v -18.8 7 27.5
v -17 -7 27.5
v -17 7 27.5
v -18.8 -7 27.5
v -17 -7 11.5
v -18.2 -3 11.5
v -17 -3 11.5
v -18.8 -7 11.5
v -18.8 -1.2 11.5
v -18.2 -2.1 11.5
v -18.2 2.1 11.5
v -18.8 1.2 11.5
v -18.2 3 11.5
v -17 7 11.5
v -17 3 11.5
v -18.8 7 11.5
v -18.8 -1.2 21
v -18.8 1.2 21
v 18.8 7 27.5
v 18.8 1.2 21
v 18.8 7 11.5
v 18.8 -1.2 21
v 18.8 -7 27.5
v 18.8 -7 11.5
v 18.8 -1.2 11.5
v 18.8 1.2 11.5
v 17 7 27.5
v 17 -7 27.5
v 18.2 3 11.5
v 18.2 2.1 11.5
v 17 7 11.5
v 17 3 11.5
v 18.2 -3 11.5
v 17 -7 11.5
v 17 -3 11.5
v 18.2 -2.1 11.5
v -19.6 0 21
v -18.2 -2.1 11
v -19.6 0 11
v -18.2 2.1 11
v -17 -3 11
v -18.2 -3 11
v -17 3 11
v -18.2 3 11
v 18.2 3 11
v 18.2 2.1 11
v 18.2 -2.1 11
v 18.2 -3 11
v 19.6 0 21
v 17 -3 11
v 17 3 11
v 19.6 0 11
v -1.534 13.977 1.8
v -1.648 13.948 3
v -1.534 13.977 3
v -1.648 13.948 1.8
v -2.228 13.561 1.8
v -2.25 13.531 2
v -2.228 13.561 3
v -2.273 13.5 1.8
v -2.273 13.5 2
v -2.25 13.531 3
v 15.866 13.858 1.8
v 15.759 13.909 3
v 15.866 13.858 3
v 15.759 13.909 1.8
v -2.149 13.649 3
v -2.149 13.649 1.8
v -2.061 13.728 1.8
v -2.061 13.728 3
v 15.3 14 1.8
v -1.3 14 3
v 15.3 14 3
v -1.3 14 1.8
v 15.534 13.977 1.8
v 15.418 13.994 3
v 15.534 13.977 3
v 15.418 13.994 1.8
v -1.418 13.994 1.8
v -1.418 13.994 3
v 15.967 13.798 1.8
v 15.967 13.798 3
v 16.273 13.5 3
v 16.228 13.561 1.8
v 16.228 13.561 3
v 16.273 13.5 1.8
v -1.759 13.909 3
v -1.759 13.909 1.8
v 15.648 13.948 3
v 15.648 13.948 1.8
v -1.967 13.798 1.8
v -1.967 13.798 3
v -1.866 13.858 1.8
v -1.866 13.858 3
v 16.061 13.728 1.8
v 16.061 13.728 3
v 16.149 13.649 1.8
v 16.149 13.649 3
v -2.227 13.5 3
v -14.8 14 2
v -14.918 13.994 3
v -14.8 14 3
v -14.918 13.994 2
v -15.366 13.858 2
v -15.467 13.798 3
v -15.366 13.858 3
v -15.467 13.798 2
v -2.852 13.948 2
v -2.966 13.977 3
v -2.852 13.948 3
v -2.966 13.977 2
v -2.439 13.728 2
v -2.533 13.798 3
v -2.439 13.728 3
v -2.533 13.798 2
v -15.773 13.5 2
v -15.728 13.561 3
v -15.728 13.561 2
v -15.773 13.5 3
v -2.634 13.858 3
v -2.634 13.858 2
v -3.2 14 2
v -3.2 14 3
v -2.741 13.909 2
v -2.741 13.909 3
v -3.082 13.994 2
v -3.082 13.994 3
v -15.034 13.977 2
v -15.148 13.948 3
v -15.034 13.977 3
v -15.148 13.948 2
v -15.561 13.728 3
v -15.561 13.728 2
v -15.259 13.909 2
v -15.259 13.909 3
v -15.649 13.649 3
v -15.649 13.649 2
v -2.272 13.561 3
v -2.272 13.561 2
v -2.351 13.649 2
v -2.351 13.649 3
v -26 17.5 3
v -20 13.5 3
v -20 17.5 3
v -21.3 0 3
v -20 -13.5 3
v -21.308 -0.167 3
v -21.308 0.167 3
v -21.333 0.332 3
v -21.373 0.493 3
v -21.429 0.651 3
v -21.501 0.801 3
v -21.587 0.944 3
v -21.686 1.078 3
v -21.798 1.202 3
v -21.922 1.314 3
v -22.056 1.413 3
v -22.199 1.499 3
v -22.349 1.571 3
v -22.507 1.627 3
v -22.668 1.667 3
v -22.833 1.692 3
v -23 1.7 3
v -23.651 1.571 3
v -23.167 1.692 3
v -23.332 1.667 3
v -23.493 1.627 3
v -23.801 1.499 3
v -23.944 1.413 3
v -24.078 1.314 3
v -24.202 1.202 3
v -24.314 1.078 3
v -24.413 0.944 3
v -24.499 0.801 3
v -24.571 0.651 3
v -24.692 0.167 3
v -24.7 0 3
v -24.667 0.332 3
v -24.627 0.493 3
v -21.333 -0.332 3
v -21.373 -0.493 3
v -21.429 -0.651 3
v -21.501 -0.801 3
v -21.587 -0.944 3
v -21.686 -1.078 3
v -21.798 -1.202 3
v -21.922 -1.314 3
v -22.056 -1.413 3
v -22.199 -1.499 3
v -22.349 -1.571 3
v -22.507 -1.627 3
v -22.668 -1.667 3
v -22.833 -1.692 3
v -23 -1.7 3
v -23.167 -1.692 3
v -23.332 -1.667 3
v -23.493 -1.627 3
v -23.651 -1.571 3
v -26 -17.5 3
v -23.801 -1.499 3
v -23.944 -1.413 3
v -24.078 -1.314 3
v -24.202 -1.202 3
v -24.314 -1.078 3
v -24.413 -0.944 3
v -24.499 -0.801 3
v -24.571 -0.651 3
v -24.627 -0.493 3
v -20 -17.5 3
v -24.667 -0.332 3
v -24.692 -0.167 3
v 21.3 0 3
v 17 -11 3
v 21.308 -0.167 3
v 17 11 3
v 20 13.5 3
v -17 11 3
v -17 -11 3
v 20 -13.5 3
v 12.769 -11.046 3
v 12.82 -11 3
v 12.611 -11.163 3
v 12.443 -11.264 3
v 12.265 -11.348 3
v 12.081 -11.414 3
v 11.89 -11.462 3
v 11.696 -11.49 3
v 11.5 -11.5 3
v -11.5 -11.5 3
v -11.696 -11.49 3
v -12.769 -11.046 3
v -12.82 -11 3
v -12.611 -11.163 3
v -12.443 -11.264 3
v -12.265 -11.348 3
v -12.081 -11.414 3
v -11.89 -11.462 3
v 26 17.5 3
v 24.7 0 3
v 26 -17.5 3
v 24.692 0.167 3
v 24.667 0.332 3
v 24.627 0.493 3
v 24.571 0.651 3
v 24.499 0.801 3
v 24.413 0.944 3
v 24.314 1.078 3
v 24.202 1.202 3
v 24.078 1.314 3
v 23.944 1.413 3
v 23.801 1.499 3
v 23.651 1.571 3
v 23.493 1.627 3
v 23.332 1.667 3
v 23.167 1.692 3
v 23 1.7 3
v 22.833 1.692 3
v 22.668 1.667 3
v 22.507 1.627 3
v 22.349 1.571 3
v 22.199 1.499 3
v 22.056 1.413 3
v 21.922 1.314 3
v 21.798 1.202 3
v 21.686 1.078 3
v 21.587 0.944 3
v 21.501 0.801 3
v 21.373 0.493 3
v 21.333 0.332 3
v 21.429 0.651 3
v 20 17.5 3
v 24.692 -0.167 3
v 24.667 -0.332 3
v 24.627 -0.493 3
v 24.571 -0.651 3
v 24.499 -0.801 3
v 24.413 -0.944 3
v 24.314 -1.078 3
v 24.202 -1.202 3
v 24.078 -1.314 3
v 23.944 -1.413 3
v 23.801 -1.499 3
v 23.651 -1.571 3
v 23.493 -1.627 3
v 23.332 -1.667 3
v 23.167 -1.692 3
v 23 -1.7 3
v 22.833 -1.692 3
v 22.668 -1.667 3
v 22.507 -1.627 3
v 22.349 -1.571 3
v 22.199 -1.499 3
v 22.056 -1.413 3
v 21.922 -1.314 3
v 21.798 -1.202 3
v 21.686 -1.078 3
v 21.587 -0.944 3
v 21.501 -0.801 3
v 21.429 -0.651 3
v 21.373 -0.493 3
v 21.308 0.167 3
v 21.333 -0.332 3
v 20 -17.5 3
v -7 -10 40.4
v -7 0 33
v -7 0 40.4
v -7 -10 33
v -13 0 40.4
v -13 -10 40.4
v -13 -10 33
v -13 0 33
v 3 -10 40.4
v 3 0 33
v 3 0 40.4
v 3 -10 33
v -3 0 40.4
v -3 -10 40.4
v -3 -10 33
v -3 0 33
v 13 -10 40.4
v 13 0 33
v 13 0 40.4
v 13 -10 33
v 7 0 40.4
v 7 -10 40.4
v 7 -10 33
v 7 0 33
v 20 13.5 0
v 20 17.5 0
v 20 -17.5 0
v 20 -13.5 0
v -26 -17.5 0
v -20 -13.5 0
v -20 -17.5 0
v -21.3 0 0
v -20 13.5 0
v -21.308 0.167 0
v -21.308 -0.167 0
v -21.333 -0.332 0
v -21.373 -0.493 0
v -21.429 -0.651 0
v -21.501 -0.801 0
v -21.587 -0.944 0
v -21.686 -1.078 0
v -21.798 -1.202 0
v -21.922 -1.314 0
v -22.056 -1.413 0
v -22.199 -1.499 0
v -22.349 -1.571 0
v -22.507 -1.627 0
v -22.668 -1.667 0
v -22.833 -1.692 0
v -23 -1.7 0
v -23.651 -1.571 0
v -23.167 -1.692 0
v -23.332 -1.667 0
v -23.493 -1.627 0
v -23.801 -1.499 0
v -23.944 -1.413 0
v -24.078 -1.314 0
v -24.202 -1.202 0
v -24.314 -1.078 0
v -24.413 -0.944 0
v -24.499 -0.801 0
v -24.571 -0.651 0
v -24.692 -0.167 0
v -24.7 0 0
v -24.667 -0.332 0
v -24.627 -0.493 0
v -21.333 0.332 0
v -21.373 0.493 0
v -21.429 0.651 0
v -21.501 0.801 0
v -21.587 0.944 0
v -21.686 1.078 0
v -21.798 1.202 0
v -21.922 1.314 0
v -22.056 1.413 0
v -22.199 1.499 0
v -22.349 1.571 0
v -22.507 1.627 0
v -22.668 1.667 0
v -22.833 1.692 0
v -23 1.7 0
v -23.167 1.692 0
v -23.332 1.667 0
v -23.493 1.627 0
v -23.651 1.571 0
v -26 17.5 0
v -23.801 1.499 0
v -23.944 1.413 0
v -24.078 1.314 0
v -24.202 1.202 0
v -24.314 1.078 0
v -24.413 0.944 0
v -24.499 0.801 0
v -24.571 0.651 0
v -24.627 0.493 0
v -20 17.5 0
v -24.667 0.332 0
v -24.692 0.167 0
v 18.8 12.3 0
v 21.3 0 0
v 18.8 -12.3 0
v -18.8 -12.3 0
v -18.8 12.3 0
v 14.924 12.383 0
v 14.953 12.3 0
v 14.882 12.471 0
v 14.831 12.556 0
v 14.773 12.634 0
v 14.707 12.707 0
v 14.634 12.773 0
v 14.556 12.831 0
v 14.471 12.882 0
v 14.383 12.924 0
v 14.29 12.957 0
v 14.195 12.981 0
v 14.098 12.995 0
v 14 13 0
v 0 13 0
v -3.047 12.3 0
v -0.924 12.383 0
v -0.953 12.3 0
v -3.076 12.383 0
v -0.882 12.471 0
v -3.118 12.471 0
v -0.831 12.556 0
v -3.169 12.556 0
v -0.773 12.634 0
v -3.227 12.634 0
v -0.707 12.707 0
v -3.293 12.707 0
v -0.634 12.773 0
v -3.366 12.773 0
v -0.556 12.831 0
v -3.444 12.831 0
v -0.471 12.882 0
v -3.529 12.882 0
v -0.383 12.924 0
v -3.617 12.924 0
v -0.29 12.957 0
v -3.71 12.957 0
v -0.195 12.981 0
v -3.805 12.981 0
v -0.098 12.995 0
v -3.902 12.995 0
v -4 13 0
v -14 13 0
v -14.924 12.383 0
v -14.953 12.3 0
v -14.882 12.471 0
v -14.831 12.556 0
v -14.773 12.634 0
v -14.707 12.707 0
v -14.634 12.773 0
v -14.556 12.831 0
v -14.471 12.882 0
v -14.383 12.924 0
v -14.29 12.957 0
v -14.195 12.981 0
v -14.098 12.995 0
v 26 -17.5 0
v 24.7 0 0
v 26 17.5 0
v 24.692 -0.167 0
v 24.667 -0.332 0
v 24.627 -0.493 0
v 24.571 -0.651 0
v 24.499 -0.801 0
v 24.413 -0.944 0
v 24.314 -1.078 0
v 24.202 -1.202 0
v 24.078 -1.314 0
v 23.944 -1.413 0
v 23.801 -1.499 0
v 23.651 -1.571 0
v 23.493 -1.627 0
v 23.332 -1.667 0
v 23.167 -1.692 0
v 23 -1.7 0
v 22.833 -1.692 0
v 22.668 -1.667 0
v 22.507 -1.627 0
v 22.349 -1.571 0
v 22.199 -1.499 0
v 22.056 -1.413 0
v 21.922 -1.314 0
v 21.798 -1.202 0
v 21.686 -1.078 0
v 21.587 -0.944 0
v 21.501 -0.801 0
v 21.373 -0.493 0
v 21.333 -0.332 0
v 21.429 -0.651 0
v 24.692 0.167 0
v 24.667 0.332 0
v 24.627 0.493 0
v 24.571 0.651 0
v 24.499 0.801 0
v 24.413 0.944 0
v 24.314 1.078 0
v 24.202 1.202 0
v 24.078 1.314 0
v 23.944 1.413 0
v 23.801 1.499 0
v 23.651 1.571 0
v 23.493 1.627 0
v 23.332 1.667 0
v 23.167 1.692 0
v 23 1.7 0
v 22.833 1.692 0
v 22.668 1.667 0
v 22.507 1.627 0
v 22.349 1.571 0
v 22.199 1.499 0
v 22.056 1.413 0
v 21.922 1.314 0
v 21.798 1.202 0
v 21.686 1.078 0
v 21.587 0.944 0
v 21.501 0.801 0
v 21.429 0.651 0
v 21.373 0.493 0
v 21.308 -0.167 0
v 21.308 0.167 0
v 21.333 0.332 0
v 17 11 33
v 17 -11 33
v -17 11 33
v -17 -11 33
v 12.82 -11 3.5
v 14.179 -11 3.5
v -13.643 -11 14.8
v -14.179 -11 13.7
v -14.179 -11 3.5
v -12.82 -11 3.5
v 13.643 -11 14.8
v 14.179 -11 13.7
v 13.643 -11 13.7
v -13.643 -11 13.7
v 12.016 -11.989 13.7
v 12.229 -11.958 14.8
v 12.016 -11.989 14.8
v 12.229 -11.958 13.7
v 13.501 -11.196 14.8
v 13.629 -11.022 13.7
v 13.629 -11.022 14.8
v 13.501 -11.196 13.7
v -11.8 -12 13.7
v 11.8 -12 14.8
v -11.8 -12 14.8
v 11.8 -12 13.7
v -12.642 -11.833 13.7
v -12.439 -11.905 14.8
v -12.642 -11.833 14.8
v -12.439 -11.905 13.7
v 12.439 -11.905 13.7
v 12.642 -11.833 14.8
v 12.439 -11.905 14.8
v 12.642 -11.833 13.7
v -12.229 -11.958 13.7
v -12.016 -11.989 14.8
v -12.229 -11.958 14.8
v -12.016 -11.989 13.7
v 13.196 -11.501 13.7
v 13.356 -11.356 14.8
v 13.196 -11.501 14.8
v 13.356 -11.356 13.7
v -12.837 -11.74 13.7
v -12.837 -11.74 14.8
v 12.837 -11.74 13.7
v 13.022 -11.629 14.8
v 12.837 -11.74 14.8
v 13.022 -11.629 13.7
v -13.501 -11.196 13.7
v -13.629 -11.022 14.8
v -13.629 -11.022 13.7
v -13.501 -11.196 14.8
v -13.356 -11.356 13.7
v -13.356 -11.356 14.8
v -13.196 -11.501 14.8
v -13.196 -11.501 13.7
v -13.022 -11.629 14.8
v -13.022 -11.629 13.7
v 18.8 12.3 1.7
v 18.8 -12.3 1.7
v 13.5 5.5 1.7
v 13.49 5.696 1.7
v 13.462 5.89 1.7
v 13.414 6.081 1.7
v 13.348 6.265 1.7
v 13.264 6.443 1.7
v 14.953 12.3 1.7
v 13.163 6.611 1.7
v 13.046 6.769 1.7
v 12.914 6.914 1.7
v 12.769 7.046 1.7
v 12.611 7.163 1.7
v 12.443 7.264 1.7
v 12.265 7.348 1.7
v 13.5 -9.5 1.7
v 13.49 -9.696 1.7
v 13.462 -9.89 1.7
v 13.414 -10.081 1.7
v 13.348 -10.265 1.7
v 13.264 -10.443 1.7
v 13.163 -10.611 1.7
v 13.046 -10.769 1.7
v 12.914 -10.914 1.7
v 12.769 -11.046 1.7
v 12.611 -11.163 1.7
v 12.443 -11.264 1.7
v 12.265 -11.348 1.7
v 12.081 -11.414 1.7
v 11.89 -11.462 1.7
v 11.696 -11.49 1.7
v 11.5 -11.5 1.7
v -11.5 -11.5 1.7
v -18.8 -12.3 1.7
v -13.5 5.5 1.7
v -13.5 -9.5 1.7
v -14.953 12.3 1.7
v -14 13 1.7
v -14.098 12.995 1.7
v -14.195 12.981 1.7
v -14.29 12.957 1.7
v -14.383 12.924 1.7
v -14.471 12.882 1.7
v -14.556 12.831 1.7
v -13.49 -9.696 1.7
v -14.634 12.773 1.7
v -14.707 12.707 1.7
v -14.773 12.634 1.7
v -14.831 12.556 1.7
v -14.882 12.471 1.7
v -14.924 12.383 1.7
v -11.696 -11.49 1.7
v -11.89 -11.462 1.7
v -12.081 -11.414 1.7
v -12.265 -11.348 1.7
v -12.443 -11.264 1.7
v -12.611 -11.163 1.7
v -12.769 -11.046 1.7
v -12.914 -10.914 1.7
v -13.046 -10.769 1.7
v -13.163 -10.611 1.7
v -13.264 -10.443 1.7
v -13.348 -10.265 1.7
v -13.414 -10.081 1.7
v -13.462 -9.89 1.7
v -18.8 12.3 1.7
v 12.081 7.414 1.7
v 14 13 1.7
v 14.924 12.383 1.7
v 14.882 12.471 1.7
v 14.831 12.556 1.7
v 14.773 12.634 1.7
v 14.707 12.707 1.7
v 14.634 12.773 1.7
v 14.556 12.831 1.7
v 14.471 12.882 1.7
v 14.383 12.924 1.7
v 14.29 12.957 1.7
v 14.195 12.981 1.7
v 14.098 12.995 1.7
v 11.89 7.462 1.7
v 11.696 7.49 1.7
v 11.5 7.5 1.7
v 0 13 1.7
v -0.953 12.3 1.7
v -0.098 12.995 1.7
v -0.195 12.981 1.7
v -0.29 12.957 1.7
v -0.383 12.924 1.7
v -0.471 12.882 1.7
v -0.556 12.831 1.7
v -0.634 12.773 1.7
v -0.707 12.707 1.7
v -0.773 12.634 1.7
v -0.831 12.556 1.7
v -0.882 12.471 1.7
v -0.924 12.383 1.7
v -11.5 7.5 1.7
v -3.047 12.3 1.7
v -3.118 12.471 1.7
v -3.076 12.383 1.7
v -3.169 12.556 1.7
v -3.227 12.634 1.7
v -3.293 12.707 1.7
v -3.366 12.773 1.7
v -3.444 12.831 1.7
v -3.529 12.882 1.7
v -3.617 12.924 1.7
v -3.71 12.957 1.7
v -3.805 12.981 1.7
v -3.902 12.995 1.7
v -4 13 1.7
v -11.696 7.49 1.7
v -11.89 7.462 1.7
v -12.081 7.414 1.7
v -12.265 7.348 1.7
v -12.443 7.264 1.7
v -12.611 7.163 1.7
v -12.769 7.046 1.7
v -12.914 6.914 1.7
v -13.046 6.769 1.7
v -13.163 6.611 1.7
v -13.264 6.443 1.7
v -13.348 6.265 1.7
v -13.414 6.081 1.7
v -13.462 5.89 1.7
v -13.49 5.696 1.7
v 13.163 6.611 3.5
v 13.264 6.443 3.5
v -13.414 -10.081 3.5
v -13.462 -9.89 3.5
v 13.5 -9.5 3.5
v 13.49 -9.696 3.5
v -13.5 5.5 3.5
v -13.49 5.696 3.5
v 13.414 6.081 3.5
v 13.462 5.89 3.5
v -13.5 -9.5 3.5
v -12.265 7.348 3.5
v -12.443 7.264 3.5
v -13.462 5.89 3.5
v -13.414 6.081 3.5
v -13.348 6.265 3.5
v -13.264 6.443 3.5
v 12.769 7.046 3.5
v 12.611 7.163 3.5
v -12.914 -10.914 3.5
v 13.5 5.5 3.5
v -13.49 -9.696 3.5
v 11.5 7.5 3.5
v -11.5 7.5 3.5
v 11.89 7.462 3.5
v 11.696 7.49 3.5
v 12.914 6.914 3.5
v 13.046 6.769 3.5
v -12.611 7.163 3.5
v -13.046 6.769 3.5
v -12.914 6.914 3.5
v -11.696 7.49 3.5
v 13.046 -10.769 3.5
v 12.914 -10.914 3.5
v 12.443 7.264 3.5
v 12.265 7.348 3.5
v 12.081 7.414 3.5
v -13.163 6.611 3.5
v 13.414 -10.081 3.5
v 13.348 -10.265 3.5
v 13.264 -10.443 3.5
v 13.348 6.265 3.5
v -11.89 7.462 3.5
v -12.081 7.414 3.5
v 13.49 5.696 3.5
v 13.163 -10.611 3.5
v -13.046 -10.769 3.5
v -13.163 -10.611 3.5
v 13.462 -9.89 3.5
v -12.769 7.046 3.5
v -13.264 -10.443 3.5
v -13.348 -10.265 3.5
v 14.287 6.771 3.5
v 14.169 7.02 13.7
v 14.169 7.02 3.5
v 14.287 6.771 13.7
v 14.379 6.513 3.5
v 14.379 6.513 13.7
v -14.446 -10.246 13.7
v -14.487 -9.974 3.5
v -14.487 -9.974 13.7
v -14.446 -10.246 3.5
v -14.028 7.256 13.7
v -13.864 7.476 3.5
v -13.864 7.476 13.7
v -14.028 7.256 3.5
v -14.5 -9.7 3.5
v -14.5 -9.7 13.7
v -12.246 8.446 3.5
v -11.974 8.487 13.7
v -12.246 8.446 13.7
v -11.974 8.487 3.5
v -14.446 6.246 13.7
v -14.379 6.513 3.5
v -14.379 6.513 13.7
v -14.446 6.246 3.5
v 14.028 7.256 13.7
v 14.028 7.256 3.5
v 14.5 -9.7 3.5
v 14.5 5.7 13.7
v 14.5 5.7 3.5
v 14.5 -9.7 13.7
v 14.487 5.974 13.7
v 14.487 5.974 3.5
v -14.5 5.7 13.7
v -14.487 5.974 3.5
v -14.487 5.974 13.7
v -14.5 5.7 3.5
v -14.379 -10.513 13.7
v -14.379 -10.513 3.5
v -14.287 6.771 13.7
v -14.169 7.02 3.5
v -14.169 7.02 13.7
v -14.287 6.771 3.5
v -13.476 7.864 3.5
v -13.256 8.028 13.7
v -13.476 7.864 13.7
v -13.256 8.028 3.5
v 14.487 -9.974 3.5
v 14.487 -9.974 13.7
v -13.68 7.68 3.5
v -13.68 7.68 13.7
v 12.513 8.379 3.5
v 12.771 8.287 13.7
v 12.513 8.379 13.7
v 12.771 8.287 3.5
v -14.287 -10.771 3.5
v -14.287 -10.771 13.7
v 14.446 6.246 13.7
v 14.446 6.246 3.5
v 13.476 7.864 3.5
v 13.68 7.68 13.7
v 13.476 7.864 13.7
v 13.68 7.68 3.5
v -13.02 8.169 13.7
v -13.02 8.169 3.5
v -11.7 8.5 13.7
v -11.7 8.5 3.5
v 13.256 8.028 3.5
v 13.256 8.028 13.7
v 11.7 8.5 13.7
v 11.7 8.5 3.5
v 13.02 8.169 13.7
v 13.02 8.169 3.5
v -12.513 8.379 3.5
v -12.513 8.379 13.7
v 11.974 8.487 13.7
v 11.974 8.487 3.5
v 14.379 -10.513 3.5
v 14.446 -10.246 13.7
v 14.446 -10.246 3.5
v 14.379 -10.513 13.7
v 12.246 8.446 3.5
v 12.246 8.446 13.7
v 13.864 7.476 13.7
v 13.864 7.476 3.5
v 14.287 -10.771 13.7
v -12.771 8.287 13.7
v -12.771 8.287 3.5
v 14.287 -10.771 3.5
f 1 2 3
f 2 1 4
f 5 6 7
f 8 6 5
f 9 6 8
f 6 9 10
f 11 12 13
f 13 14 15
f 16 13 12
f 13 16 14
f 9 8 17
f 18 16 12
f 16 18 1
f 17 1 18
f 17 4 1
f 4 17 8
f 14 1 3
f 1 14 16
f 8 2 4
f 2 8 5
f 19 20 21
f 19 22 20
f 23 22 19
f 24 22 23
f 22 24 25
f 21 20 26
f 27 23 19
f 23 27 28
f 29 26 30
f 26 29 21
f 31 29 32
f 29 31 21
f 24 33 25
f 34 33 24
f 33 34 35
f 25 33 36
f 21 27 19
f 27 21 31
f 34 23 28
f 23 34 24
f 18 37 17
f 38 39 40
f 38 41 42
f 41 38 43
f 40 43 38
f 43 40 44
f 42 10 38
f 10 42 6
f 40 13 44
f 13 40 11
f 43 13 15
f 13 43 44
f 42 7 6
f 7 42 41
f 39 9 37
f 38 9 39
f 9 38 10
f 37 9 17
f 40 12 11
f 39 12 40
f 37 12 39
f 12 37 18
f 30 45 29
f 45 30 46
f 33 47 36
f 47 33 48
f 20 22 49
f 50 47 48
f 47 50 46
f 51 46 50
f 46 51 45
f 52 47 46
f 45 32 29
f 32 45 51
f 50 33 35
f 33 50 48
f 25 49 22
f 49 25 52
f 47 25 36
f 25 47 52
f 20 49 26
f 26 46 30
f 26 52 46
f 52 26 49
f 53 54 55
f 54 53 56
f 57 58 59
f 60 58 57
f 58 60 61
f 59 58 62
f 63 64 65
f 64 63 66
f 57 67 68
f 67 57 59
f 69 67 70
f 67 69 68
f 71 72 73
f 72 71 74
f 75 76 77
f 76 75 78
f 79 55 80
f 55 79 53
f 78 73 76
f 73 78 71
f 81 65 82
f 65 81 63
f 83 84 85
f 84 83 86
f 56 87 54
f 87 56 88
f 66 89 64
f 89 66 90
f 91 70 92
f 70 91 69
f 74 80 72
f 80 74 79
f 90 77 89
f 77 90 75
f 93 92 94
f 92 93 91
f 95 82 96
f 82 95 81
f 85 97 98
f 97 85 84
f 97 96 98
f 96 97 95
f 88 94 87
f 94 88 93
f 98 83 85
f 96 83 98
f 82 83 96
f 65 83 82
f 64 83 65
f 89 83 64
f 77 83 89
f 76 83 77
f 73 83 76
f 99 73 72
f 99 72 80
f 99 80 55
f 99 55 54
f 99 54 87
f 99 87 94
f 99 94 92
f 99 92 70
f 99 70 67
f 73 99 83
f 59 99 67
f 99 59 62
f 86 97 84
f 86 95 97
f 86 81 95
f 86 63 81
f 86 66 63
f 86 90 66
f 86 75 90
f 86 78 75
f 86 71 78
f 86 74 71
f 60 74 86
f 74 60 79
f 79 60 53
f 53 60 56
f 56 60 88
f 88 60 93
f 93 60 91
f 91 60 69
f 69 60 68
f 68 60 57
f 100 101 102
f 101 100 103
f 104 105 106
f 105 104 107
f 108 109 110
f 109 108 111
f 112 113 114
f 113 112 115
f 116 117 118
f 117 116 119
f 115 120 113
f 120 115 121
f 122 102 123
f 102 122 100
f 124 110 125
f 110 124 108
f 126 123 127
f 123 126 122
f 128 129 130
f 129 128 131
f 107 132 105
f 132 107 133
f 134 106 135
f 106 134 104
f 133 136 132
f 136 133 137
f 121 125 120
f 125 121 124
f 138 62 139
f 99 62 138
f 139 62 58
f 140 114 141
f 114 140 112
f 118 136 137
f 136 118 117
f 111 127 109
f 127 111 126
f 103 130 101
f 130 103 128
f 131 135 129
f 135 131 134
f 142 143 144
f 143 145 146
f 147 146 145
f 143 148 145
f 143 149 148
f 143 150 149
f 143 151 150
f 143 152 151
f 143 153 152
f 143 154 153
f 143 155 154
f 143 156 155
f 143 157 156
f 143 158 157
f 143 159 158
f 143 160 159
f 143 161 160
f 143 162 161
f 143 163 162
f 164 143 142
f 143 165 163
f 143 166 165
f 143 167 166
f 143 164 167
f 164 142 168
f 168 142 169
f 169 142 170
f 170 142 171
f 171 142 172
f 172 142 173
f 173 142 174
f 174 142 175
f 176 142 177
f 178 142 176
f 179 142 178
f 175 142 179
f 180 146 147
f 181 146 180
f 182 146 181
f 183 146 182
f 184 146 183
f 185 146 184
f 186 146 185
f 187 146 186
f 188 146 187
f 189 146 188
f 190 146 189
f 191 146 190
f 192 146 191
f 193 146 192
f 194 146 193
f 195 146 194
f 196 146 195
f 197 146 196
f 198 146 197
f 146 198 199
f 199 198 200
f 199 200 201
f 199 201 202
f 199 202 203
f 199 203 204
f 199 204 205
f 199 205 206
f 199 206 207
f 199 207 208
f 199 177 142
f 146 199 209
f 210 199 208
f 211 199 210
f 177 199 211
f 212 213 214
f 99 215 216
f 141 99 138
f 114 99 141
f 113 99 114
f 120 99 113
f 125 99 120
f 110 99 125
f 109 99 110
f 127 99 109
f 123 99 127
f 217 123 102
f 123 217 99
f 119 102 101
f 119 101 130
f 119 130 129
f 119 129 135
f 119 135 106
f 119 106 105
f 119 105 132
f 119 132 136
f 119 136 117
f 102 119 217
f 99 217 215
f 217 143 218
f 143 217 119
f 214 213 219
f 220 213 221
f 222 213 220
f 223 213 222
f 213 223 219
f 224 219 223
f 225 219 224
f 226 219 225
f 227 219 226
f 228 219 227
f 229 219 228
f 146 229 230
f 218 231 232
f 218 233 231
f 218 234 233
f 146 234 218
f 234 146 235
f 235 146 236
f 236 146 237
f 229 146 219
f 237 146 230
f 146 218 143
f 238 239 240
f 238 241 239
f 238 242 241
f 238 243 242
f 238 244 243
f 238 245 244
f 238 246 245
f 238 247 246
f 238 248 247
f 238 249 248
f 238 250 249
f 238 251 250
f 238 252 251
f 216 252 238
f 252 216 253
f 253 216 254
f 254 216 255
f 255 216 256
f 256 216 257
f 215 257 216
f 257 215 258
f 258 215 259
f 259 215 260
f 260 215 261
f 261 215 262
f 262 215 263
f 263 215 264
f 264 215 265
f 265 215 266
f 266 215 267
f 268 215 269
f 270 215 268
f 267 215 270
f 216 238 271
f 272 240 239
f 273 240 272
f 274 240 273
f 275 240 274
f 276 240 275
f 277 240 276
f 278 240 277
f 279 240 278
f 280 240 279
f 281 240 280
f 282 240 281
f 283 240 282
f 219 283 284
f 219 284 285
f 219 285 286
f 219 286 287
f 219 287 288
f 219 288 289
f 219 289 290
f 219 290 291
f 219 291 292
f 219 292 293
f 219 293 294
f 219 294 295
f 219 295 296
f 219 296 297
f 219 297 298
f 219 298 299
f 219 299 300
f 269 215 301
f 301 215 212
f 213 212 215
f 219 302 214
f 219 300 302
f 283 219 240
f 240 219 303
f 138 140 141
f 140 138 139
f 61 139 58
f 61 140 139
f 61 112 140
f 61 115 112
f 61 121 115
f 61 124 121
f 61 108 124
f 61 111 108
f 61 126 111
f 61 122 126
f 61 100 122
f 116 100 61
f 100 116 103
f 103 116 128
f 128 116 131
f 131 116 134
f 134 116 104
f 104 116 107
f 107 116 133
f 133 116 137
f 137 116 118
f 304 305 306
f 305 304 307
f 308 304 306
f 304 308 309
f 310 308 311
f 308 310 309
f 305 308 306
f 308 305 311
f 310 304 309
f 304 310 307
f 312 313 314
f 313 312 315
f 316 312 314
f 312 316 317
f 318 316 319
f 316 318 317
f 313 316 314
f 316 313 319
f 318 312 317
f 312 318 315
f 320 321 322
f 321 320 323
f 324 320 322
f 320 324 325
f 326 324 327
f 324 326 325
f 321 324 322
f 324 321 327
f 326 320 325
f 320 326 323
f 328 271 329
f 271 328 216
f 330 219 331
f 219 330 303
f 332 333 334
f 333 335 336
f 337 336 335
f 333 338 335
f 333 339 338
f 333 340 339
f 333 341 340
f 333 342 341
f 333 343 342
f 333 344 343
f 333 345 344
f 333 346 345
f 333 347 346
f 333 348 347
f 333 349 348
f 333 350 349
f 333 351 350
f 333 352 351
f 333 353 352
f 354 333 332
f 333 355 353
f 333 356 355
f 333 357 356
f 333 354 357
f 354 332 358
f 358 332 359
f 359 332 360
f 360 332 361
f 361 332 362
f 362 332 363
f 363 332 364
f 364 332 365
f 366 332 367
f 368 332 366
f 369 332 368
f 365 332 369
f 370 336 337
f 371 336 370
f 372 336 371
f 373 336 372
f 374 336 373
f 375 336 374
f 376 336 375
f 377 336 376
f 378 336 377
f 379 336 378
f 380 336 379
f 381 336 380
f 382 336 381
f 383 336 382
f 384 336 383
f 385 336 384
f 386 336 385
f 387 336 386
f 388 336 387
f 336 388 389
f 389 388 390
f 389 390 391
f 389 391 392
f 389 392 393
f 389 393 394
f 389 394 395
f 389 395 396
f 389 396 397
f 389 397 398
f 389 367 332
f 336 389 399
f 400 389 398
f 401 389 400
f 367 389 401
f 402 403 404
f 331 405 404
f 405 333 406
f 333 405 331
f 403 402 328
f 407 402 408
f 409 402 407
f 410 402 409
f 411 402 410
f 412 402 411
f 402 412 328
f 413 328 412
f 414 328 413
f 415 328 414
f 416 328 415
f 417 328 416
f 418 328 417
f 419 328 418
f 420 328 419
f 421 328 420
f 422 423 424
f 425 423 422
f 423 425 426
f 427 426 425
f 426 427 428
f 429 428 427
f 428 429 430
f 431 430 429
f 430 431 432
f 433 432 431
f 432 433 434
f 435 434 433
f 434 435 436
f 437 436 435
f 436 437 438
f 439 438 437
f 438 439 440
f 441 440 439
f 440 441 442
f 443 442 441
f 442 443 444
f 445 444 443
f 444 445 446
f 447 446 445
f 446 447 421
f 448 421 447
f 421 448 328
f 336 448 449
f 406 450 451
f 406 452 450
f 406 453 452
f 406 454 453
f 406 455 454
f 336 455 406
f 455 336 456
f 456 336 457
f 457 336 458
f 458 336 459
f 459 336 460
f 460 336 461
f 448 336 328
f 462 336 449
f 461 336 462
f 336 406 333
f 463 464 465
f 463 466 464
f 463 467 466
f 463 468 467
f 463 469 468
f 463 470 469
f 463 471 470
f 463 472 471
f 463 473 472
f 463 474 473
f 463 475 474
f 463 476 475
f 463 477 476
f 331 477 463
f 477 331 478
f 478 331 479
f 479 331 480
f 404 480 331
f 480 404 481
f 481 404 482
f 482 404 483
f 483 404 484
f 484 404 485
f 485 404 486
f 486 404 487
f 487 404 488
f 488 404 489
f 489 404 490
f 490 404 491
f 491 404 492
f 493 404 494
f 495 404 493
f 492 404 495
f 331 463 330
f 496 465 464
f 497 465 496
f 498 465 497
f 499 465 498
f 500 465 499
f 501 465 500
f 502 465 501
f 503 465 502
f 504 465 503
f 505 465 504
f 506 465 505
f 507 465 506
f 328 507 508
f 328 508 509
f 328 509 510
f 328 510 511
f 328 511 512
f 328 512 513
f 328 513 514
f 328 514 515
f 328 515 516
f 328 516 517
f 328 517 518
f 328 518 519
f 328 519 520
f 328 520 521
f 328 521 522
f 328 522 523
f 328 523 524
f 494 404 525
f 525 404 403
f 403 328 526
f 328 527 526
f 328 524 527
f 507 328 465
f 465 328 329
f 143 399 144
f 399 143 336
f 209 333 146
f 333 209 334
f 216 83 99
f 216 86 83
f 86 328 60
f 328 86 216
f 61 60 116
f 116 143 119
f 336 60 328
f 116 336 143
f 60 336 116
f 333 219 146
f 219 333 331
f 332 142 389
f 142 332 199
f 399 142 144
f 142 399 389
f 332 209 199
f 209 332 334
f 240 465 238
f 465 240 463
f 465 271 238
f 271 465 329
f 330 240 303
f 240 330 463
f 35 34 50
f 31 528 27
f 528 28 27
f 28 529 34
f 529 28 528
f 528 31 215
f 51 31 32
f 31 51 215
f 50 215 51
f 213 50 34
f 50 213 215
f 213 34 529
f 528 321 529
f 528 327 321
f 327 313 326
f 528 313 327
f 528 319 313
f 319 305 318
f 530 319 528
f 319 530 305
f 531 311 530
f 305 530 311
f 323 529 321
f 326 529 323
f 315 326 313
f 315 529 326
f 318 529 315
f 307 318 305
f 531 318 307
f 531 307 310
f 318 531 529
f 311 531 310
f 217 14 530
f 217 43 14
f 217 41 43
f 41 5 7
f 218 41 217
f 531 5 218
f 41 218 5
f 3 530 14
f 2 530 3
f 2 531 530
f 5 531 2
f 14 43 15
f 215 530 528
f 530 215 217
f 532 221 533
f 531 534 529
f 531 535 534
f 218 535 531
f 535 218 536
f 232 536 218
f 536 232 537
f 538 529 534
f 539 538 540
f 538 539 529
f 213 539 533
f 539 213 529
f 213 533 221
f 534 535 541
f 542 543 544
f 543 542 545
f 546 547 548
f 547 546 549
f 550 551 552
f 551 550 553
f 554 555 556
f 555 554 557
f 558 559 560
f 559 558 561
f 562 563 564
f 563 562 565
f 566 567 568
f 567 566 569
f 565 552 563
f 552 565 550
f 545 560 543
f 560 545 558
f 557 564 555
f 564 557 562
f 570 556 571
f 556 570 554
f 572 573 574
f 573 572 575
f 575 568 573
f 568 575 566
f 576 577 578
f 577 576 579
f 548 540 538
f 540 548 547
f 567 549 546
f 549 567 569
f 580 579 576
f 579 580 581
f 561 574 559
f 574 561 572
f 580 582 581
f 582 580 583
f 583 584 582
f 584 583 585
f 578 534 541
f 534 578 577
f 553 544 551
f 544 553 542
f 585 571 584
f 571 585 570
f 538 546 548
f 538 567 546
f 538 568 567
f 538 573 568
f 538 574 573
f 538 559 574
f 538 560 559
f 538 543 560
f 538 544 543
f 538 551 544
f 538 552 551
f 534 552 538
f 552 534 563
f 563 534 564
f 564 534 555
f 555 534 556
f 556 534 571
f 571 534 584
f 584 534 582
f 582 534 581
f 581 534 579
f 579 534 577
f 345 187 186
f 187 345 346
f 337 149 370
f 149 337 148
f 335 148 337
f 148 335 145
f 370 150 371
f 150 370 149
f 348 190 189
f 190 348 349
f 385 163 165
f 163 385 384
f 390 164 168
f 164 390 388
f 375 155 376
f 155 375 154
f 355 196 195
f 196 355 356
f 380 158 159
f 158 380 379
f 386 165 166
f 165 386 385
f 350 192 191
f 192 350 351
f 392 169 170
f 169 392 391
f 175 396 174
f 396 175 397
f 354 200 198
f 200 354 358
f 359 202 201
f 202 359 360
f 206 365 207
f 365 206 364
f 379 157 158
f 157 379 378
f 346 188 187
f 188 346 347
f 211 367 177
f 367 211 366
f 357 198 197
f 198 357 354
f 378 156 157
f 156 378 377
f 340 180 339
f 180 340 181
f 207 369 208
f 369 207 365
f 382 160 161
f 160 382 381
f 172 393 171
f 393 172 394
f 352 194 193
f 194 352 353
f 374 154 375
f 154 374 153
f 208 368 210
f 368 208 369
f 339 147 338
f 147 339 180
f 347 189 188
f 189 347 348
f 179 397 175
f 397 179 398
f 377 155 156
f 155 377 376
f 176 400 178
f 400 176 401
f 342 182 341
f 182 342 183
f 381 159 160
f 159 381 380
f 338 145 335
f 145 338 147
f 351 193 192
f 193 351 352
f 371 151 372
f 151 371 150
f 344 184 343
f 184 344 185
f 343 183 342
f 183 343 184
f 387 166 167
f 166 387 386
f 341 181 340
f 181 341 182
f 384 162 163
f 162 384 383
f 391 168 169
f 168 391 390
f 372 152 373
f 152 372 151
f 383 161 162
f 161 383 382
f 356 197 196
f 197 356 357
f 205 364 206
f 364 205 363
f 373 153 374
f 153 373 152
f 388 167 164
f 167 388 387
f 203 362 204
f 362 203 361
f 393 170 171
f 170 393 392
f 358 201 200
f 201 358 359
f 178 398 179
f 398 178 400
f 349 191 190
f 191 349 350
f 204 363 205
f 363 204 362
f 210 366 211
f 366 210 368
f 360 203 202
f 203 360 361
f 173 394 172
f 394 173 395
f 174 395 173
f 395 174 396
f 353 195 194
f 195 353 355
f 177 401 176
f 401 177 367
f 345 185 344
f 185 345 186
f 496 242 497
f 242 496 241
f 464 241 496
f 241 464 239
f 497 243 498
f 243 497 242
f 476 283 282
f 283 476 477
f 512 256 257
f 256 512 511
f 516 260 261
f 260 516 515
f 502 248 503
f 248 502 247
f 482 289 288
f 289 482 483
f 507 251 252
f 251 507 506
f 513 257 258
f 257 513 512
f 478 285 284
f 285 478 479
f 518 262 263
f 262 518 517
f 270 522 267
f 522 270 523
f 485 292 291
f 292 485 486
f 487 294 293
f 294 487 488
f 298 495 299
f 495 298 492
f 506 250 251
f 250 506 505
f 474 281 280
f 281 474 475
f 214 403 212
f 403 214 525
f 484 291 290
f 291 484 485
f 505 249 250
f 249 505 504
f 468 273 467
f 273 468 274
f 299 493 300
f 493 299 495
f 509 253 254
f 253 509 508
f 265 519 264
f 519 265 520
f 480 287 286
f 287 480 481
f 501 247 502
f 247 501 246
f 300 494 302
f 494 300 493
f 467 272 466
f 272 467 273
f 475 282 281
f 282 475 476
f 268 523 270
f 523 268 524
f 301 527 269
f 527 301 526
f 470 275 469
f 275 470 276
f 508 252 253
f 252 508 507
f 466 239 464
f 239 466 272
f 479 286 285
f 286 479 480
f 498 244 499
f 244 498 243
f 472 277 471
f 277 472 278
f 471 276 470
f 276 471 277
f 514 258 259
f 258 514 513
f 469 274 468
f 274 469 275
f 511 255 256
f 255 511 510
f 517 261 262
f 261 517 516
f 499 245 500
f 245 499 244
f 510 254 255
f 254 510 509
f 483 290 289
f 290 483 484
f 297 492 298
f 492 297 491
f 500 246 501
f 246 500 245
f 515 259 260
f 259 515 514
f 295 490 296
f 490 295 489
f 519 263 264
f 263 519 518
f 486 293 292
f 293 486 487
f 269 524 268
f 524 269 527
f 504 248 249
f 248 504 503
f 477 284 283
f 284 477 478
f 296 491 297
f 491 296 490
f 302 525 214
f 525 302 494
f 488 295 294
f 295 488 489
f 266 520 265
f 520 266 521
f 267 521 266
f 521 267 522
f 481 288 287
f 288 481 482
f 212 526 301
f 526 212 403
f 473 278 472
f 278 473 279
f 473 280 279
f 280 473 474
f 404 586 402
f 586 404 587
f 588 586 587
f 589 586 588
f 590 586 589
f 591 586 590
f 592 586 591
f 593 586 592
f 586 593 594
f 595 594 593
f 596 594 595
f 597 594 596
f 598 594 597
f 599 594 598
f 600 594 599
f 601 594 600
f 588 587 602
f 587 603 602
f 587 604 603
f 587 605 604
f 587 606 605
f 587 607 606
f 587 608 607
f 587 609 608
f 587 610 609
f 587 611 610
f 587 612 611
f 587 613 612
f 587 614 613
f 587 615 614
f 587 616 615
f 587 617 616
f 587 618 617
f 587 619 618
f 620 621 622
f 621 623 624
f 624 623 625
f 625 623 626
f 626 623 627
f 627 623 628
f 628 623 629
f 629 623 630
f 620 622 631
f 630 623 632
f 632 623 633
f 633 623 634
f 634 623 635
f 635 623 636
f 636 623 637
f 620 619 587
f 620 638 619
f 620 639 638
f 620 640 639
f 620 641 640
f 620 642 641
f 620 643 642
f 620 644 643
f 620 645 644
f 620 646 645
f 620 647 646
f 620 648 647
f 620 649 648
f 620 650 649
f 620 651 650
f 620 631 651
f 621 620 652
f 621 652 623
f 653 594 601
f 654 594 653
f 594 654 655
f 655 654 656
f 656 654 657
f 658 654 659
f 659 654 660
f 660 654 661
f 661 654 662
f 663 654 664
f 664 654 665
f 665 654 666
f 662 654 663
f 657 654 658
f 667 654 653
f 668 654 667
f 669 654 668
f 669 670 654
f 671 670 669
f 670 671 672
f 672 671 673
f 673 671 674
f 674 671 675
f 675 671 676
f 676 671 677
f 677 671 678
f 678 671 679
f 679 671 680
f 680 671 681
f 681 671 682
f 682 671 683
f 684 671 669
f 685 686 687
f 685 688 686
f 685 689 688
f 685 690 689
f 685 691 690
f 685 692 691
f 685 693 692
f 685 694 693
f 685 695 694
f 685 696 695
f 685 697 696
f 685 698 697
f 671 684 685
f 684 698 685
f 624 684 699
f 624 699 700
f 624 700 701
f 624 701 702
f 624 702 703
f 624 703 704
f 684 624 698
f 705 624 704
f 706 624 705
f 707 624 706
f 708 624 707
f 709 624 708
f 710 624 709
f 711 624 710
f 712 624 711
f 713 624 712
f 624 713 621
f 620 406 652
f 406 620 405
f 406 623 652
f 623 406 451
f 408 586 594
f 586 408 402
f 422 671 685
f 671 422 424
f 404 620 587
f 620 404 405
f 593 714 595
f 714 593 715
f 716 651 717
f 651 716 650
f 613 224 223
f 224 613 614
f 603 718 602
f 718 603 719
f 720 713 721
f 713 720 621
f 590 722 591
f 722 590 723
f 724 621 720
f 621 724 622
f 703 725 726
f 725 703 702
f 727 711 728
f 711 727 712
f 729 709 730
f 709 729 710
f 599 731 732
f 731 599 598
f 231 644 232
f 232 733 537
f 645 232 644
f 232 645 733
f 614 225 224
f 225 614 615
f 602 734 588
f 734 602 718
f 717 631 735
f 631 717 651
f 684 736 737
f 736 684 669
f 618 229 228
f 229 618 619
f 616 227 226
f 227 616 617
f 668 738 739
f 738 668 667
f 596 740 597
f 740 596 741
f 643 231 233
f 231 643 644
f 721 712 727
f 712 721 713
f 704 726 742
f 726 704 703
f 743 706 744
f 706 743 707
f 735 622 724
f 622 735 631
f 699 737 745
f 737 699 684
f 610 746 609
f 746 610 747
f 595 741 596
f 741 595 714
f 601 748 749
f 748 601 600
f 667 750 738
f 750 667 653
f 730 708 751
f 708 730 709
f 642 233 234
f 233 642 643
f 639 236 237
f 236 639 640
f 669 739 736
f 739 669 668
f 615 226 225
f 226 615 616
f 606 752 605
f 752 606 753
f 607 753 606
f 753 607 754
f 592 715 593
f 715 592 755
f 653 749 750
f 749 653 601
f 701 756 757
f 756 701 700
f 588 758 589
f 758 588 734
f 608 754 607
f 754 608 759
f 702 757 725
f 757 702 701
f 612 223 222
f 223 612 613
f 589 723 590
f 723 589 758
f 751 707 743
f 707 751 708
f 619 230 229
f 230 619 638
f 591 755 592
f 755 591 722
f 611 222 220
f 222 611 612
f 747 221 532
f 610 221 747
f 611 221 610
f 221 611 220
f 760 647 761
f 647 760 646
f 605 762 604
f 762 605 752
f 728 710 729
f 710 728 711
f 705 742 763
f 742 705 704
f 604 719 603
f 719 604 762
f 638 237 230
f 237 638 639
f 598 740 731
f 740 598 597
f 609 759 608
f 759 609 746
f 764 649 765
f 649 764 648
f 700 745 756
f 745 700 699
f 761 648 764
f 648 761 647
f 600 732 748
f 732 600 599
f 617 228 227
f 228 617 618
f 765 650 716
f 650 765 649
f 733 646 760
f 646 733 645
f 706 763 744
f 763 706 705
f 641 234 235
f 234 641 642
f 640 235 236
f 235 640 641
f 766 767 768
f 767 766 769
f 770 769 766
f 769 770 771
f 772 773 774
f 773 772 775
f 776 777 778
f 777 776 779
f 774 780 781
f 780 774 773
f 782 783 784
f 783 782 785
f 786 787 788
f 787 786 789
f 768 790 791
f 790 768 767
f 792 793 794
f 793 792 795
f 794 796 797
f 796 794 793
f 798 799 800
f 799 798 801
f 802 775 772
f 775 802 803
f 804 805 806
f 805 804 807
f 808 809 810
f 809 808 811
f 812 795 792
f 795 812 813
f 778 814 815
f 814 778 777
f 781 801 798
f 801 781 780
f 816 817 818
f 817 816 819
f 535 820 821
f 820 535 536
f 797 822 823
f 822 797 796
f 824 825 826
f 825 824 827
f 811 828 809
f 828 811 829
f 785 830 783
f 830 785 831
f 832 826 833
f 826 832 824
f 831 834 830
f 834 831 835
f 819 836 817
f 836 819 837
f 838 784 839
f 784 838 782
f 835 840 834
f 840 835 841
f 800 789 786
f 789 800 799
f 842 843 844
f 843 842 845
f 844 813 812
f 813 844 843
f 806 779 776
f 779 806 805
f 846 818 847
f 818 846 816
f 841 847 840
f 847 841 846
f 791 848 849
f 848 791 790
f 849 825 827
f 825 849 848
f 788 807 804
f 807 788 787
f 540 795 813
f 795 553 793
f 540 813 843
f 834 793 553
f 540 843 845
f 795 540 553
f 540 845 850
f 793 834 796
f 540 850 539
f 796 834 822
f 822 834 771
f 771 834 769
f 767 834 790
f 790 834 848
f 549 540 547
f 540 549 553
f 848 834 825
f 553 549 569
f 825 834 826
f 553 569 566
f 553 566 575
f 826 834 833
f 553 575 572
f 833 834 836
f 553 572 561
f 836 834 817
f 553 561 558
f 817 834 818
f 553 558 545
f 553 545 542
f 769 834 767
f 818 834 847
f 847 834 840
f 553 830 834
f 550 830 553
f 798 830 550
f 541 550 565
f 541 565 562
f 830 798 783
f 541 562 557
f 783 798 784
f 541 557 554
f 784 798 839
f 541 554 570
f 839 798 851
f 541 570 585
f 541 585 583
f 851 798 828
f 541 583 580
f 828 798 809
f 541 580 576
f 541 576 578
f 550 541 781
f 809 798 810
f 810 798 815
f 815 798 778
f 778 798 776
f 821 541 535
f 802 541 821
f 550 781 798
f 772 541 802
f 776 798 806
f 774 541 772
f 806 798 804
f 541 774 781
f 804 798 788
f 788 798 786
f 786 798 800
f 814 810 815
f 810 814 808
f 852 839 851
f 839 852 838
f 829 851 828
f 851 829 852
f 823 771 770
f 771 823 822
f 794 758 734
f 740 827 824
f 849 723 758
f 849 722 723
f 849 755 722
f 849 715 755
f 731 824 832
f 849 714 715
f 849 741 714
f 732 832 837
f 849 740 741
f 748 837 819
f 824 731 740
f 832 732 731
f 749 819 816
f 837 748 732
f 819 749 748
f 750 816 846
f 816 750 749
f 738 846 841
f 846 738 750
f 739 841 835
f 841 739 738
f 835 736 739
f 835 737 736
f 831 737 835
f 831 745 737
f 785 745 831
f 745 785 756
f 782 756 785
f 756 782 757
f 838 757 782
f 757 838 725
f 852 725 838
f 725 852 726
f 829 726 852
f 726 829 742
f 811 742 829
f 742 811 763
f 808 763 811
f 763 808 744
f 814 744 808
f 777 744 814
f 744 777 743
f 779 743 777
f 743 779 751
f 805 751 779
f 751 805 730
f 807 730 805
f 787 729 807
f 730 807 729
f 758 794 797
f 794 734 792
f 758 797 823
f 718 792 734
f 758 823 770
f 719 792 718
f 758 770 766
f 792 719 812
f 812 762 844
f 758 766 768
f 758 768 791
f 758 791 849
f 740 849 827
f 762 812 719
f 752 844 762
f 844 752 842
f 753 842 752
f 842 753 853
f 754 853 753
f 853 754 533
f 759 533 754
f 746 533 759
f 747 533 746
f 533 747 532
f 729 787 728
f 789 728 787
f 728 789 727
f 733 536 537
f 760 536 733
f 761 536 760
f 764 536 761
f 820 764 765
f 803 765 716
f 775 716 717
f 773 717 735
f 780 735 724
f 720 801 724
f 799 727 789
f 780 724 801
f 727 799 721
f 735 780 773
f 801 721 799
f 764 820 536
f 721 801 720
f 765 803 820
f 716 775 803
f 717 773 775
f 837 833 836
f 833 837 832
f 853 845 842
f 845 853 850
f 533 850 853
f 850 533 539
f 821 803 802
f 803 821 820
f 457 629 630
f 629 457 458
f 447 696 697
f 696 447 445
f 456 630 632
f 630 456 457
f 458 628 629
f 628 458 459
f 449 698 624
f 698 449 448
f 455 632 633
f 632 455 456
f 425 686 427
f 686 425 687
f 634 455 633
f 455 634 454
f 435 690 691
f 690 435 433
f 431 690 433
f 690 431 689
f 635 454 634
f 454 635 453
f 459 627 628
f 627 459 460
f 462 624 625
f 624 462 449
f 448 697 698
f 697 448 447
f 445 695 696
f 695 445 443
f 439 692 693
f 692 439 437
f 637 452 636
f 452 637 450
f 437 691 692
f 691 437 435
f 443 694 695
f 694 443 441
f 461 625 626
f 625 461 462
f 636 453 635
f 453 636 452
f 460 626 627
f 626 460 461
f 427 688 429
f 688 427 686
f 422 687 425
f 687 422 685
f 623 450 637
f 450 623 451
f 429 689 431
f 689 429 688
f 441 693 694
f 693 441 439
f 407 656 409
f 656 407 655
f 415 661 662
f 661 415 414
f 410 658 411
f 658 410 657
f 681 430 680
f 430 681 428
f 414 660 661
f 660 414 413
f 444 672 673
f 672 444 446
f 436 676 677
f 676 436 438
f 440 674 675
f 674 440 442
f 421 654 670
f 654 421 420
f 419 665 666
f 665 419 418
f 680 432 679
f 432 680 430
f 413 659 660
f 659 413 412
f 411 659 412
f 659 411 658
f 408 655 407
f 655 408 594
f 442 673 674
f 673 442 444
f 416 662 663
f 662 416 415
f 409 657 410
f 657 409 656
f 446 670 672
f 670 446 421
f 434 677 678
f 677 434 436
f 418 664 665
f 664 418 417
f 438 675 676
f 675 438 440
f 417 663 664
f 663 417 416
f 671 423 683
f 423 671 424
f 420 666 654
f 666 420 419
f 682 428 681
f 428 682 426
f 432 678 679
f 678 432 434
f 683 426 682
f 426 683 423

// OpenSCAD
// IEC Switched Fused Power Inlet Module (approximate geometry)
// Target faceplate/module size: 40.0mm x 27.0mm
// STRUCTURAL FIXES (connectivity):
// - Orange internal insert is now physically attached to the main body via a solid "tongue" that
//   overlaps into the body by ~1–2mm (not just proximity).
// - Orange insert is also prevented from being fully removed by the inlet cavity subtraction by
//   placing it slightly deeper than the cavity and adding the tongue behind the cavity.
// - All solids are combined in a single union() (inside one difference()).

$fn = 64;

module rrect2d(w, h, r) {
    r2 = min(r, min(w, h)/2);
    hull() {
        for (sx = [-1, 1], sy = [-1, 1])
            translate([sx*(w/2 - r2), sy*(h/2 - r2)])
                circle(r=r2);
    }
}

module rrect3d(w, h, d, r, center=true) {
    linear_extrude(height=d, center=center)
        rrect2d(w, h, r);
}

module iec_inlet_module() {

    // --- Key dimensions (mm) ---
    face_w = 40.0;
    face_h = 27.0;
    flange_t = 3.0;

    // Flange ears (mounting tabs)
    ear_w = 6.0;
    ear_h = 4.0;
    ear_t = flange_t;

    // Main body behind flange
    body_w = 34.0;
    body_h = 22.0;
    body_d = 30.0;

    // Front bezel recess
    recess_d = 1.6;
    bezel_margin = 1.2;

    // IEC C14 inlet opening (rounded rectangle)
    inlet_w = 27.0;
    inlet_h = 19.0;
    inlet_r = 2.0;

    // Deeper cavity behind inlet
    inlet_cavity_d = 10.0;
    inlet_cavity_w = inlet_w + 2.0;
    inlet_cavity_h = inlet_h + 2.0;
    inlet_cavity_r = inlet_r + 0.8;

    // Switch + fuse openings (front face, above inlet)
    top_band_h = 7.0;
    sw_w = 12.0;
    sw_h = 6.0;
    sw_r = 1.0;

    fuse_w = 16.0;
    fuse_h = 6.0;
    fuse_r = 1.0;

    gap = 2.0;

    // Fuse drawer "lip"
    fuse_lip_t = 1.2;
    fuse_lip_w = fuse_w + 3.0;
    fuse_lip_h = fuse_h + 2.0;
    fuse_lip_r = 1.2;

    // Switch rocker bezel
    sw_lip_t = 1.0;
    sw_lip_w = sw_w + 2.0;
    sw_lip_h = sw_h + 2.0;
    sw_lip_r = 1.2;

    // Mounting holes on ears (2 holes, left/right)
    hole_r = 1.7;
    hole_x = face_w/2 + ear_w/2;
    hole_y = 0;

    // Panel retention spring bumps (simple wedges on body sides)
    latch_w = 2.0;
    latch_h = 6.0;
    latch_d = 10.0;
    latch_inset_from_front = 8.0;

    // Rear spade terminals (connected via a rear base block)
    spade_w = 6.0;
    spade_h = 10.0;
    spade_len = 8.0;
    spade_pitch = 10.0;
    spade_base_t = 2.0;

    // --- STRUCTURAL FIX PARAMETERS (overlaps/attachments) ---
    overlap = 1.2; // 1–2mm overlap to guarantee manifold connection

    // "Orange internal insert" (create a connected internal block)
    insert_w = inlet_cavity_w - 1.0;   // slightly smaller than cavity
    insert_h = inlet_cavity_h - 1.0;
    insert_d = inlet_cavity_d - 1.0;
    insert_r = max(0.6, inlet_cavity_r - 0.6);

    // Side rails (dark side components)
    side_part_w = 3.0;
    side_part_h = 14.0;
    side_part_d = 16.0;

    // Derived placements
    // Coordinate system: X=width, Y=height, Z=depth
    // Front face of flange at z=0, rear extends to +Z.
    body_z0 = flange_t;
    body_zc = body_z0 + body_d/2;

    assert(body_w <= face_w && body_h <= face_h);

    // Inlet opening centered in lower portion
    bottom_margin = 2.0;
    inlet_yc = -face_h/2 + bottom_margin + inlet_h/2;
    inlet_xc = 0;

    // Top band centerline for switch/fuse
    top_band_yc = face_h/2 - top_band_h/2;

    // Place switch and fuse side-by-side in top band
    total_top_w = sw_w + gap + fuse_w;
    sw_xc   = -total_top_w/2 + sw_w/2;
    fuse_xc =  total_top_w/2 - fuse_w/2;

    // Rear spade base block (connects spades to body)
    spade_base_w = (2*spade_pitch) + spade_w;
    spade_base_h = 12.0;
    spade_base_z0 = body_z0 + body_d - spade_base_t; // overlaps into body
    spade_base_zc = spade_base_z0 + spade_base_t/2;

    // Spade positions (3 terminals)
    spade_yc = -body_h/2 + spade_base_h/2;
    spade_z0 = body_z0 + body_d - 0.6; // start slightly inside body for overlap
    spade_zc = spade_z0 + spade_len/2;

    // Latch placement (on body sides)
    latch_zc = body_z0 + latch_inset_from_front + latch_d/2;
    latch_yc = 0;

    // Inlet cavity placement
    cavity_z0 = flange_t + 0.6;
    cavity_z1 = cavity_z0 + inlet_cavity_d;
    cavity_zc = (cavity_z0 + cavity_z1)/2;

    // --- ORANGE INSERT CONNECTIVITY FIX ---
    // The cavity subtraction removes material from z=[cavity_z0..cavity_z1].
    // If the insert sits entirely inside that range, it can appear "separate" in side views.
    // Fix: push the insert slightly deeper so it intersects solid body behind the cavity,
    // and add a "tongue" that extends further into the body with 1–2mm overlap.
    insert_z1 = cavity_z1 + overlap;                 // extend past cavity into solid body
    insert_z0 = insert_z1 - insert_d;
    insert_zc = (insert_z0 + insert_z1)/2;

    // Tongue: starts inside the insert and extends into the body beyond the cavity
    tongue_t = 3.0;                                 // along Z
    tongue_w = insert_w * 0.55;
    tongue_h = insert_h * 0.55;
    tongue_z0 = cavity_z1 - overlap;                // begins slightly before cavity ends
    tongue_z1 = tongue_z0 + tongue_t;
    tongue_zc = (tongue_z0 + tongue_z1)/2;

    // Side parts: attach to body sides with overlap into body
    side_xc = (body_w/2 + side_part_w/2 - overlap); // ensures intersection
    side_yc = 0;
    side_zc = body_z0 + body_d*0.55;

    difference() {
        union() {
            // --- Front flange with ears ---
            translate([0, 0, flange_t/2])
                cube([face_w, face_h, flange_t], center=true);

            translate([-(face_w/2 + ear_w/2), 0, flange_t/2])
                cube([ear_w, face_h + 2*ear_h, ear_t], center=true);

            translate([ (face_w/2 + ear_w/2), 0, flange_t/2])
                cube([ear_w, face_h + 2*ear_h, ear_t], center=true);

            // --- Main body behind flange ---
            translate([0, 0, body_zc])
                cube([body_w, body_h, body_d], center=true);

            // --- Side dark components (rails) ATTACHED to body with overlap ---
            for (sx = [-1, 1]) {
                translate([sx*side_xc, side_yc, side_zc])
                    cube([side_part_w, side_part_h, side_part_d], center=true);

                // Tie block to guarantee connection continuity
                translate([sx*(body_w/2 - overlap/2), side_yc, side_zc])
                    cube([overlap + 0.6, side_part_h, side_part_d], center=true);
            }

            // --- Panel retention latches (connected to body) ---
            for (sx = [-1, 1]) {
                translate([sx*(body_w/2 - latch_w/2 + overlap/2), latch_yc, latch_zc])
                    cube([latch_w + overlap, latch_h, latch_d], center=true);

                translate([sx*(body_w/2 + 0.6), latch_yc, latch_zc])
                    linear_extrude(height=latch_d, center=true)
                        polygon(points=[
                            [0, -latch_h/2],
                            [0,  latch_h/2],
                            [sx*2.0, 0]
                        ]);
            }

            // --- Fuse drawer lip (protruding frame) ---
            translate([fuse_xc, top_band_yc, flange_t - fuse_lip_t/2])
                difference() {
                    rrect3d(fuse_lip_w, fuse_lip_h, fuse_lip_t, fuse_lip_r, center=true);
                    rrect3d(fuse_w + 0.8, fuse_h + 0.8, fuse_lip_t + 0.2, max(0.2, fuse_r), center=true);
                }

            // --- Switch bezel lip (protruding frame) ---
            translate([sw_xc, top_band_yc, flange_t - sw_lip_t/2])
                difference() {
                    rrect3d(sw_lip_w, sw_lip_h, sw_lip_t, sw_lip_r, center=true);
                    rrect3d(sw_w + 0.8, sw_h + 0.8, sw_lip_t + 0.2, max(0.2, sw_r), center=true);
                }

            // --- Rear spade base (ensures spades are connected) ---
            translate([0, spade_yc, spade_base_zc])
                cube([spade_base_w, spade_base_h, spade_base_t], center=true);

            // --- Spade terminals (3) ---
            for (i = [-1, 0, 1]) {
                translate([i*spade_pitch, spade_yc, spade_zc])
                    cube([spade_w, spade_h, spade_len], center=true);

                translate([i*spade_pitch, spade_yc, spade_z0 + spade_base_t/2])
                    cube([spade_w, spade_h, spade_base_t], center=true);
            }

            // --- Orange internal insert/block (NOW PHYSICALLY ATTACHED) ---
            // Insert extends slightly beyond the cavity into solid body.
            color([1, 0.5, 0])
                translate([inlet_xc, inlet_yc, insert_zc])
                    rrect3d(insert_w, insert_h, insert_d, insert_r, center=true);

            // Tongue: guarantees a solid connection to the body behind the cavity
            // (overlaps into solid body by ~overlap and overlaps into insert volume).
            color([1, 0.5, 0])
                translate([inlet_xc, inlet_yc, tongue_zc])
                    rrect3d(tongue_w, tongue_h, tongue_t, insert_r, center=true);
        }

        // --- Front bezel recess pocket ---
        translate([0, 0, recess_d/2])
            cube([face_w - 2*bezel_margin, face_h - 2*bezel_margin, recess_d + 0.2], center=true);

        // --- IEC inlet opening through flange + a bit into body ---
        translate([inlet_xc, inlet_yc, (flange_t + 2.0)/2])
            rrect3d(inlet_w, inlet_h, flange_t + 2.0 + 0.2, inlet_r, center=true);

        // --- Deeper inlet cavity behind opening ---
        translate([inlet_xc, inlet_yc, cavity_zc])
            rrect3d(inlet_cavity_w, inlet_cavity_h, inlet_cavity_d + 0.2, inlet_cavity_r, center=true);

        // --- Switch opening (shallow recess) ---
        translate([sw_xc, top_band_yc, recess_d/2])
            rrect3d(sw_w, sw_h, recess_d + 0.2, sw_r, center=true);

        // --- Fuse drawer opening (shallow recess) ---
        translate([fuse_xc, top_band_yc, recess_d/2])
            rrect3d(fuse_w, fuse_h, recess_d + 0.2, fuse_r, center=true);

        // --- Mounting holes (through ears/flange) ---
        for (sx = [-1, 1])
            translate([sx*hole_x, hole_y, flange_t/2])
                cylinder(h=flange_t + 0.6, r=hole_r, center=true);
    }
}

iec_inlet_module();
